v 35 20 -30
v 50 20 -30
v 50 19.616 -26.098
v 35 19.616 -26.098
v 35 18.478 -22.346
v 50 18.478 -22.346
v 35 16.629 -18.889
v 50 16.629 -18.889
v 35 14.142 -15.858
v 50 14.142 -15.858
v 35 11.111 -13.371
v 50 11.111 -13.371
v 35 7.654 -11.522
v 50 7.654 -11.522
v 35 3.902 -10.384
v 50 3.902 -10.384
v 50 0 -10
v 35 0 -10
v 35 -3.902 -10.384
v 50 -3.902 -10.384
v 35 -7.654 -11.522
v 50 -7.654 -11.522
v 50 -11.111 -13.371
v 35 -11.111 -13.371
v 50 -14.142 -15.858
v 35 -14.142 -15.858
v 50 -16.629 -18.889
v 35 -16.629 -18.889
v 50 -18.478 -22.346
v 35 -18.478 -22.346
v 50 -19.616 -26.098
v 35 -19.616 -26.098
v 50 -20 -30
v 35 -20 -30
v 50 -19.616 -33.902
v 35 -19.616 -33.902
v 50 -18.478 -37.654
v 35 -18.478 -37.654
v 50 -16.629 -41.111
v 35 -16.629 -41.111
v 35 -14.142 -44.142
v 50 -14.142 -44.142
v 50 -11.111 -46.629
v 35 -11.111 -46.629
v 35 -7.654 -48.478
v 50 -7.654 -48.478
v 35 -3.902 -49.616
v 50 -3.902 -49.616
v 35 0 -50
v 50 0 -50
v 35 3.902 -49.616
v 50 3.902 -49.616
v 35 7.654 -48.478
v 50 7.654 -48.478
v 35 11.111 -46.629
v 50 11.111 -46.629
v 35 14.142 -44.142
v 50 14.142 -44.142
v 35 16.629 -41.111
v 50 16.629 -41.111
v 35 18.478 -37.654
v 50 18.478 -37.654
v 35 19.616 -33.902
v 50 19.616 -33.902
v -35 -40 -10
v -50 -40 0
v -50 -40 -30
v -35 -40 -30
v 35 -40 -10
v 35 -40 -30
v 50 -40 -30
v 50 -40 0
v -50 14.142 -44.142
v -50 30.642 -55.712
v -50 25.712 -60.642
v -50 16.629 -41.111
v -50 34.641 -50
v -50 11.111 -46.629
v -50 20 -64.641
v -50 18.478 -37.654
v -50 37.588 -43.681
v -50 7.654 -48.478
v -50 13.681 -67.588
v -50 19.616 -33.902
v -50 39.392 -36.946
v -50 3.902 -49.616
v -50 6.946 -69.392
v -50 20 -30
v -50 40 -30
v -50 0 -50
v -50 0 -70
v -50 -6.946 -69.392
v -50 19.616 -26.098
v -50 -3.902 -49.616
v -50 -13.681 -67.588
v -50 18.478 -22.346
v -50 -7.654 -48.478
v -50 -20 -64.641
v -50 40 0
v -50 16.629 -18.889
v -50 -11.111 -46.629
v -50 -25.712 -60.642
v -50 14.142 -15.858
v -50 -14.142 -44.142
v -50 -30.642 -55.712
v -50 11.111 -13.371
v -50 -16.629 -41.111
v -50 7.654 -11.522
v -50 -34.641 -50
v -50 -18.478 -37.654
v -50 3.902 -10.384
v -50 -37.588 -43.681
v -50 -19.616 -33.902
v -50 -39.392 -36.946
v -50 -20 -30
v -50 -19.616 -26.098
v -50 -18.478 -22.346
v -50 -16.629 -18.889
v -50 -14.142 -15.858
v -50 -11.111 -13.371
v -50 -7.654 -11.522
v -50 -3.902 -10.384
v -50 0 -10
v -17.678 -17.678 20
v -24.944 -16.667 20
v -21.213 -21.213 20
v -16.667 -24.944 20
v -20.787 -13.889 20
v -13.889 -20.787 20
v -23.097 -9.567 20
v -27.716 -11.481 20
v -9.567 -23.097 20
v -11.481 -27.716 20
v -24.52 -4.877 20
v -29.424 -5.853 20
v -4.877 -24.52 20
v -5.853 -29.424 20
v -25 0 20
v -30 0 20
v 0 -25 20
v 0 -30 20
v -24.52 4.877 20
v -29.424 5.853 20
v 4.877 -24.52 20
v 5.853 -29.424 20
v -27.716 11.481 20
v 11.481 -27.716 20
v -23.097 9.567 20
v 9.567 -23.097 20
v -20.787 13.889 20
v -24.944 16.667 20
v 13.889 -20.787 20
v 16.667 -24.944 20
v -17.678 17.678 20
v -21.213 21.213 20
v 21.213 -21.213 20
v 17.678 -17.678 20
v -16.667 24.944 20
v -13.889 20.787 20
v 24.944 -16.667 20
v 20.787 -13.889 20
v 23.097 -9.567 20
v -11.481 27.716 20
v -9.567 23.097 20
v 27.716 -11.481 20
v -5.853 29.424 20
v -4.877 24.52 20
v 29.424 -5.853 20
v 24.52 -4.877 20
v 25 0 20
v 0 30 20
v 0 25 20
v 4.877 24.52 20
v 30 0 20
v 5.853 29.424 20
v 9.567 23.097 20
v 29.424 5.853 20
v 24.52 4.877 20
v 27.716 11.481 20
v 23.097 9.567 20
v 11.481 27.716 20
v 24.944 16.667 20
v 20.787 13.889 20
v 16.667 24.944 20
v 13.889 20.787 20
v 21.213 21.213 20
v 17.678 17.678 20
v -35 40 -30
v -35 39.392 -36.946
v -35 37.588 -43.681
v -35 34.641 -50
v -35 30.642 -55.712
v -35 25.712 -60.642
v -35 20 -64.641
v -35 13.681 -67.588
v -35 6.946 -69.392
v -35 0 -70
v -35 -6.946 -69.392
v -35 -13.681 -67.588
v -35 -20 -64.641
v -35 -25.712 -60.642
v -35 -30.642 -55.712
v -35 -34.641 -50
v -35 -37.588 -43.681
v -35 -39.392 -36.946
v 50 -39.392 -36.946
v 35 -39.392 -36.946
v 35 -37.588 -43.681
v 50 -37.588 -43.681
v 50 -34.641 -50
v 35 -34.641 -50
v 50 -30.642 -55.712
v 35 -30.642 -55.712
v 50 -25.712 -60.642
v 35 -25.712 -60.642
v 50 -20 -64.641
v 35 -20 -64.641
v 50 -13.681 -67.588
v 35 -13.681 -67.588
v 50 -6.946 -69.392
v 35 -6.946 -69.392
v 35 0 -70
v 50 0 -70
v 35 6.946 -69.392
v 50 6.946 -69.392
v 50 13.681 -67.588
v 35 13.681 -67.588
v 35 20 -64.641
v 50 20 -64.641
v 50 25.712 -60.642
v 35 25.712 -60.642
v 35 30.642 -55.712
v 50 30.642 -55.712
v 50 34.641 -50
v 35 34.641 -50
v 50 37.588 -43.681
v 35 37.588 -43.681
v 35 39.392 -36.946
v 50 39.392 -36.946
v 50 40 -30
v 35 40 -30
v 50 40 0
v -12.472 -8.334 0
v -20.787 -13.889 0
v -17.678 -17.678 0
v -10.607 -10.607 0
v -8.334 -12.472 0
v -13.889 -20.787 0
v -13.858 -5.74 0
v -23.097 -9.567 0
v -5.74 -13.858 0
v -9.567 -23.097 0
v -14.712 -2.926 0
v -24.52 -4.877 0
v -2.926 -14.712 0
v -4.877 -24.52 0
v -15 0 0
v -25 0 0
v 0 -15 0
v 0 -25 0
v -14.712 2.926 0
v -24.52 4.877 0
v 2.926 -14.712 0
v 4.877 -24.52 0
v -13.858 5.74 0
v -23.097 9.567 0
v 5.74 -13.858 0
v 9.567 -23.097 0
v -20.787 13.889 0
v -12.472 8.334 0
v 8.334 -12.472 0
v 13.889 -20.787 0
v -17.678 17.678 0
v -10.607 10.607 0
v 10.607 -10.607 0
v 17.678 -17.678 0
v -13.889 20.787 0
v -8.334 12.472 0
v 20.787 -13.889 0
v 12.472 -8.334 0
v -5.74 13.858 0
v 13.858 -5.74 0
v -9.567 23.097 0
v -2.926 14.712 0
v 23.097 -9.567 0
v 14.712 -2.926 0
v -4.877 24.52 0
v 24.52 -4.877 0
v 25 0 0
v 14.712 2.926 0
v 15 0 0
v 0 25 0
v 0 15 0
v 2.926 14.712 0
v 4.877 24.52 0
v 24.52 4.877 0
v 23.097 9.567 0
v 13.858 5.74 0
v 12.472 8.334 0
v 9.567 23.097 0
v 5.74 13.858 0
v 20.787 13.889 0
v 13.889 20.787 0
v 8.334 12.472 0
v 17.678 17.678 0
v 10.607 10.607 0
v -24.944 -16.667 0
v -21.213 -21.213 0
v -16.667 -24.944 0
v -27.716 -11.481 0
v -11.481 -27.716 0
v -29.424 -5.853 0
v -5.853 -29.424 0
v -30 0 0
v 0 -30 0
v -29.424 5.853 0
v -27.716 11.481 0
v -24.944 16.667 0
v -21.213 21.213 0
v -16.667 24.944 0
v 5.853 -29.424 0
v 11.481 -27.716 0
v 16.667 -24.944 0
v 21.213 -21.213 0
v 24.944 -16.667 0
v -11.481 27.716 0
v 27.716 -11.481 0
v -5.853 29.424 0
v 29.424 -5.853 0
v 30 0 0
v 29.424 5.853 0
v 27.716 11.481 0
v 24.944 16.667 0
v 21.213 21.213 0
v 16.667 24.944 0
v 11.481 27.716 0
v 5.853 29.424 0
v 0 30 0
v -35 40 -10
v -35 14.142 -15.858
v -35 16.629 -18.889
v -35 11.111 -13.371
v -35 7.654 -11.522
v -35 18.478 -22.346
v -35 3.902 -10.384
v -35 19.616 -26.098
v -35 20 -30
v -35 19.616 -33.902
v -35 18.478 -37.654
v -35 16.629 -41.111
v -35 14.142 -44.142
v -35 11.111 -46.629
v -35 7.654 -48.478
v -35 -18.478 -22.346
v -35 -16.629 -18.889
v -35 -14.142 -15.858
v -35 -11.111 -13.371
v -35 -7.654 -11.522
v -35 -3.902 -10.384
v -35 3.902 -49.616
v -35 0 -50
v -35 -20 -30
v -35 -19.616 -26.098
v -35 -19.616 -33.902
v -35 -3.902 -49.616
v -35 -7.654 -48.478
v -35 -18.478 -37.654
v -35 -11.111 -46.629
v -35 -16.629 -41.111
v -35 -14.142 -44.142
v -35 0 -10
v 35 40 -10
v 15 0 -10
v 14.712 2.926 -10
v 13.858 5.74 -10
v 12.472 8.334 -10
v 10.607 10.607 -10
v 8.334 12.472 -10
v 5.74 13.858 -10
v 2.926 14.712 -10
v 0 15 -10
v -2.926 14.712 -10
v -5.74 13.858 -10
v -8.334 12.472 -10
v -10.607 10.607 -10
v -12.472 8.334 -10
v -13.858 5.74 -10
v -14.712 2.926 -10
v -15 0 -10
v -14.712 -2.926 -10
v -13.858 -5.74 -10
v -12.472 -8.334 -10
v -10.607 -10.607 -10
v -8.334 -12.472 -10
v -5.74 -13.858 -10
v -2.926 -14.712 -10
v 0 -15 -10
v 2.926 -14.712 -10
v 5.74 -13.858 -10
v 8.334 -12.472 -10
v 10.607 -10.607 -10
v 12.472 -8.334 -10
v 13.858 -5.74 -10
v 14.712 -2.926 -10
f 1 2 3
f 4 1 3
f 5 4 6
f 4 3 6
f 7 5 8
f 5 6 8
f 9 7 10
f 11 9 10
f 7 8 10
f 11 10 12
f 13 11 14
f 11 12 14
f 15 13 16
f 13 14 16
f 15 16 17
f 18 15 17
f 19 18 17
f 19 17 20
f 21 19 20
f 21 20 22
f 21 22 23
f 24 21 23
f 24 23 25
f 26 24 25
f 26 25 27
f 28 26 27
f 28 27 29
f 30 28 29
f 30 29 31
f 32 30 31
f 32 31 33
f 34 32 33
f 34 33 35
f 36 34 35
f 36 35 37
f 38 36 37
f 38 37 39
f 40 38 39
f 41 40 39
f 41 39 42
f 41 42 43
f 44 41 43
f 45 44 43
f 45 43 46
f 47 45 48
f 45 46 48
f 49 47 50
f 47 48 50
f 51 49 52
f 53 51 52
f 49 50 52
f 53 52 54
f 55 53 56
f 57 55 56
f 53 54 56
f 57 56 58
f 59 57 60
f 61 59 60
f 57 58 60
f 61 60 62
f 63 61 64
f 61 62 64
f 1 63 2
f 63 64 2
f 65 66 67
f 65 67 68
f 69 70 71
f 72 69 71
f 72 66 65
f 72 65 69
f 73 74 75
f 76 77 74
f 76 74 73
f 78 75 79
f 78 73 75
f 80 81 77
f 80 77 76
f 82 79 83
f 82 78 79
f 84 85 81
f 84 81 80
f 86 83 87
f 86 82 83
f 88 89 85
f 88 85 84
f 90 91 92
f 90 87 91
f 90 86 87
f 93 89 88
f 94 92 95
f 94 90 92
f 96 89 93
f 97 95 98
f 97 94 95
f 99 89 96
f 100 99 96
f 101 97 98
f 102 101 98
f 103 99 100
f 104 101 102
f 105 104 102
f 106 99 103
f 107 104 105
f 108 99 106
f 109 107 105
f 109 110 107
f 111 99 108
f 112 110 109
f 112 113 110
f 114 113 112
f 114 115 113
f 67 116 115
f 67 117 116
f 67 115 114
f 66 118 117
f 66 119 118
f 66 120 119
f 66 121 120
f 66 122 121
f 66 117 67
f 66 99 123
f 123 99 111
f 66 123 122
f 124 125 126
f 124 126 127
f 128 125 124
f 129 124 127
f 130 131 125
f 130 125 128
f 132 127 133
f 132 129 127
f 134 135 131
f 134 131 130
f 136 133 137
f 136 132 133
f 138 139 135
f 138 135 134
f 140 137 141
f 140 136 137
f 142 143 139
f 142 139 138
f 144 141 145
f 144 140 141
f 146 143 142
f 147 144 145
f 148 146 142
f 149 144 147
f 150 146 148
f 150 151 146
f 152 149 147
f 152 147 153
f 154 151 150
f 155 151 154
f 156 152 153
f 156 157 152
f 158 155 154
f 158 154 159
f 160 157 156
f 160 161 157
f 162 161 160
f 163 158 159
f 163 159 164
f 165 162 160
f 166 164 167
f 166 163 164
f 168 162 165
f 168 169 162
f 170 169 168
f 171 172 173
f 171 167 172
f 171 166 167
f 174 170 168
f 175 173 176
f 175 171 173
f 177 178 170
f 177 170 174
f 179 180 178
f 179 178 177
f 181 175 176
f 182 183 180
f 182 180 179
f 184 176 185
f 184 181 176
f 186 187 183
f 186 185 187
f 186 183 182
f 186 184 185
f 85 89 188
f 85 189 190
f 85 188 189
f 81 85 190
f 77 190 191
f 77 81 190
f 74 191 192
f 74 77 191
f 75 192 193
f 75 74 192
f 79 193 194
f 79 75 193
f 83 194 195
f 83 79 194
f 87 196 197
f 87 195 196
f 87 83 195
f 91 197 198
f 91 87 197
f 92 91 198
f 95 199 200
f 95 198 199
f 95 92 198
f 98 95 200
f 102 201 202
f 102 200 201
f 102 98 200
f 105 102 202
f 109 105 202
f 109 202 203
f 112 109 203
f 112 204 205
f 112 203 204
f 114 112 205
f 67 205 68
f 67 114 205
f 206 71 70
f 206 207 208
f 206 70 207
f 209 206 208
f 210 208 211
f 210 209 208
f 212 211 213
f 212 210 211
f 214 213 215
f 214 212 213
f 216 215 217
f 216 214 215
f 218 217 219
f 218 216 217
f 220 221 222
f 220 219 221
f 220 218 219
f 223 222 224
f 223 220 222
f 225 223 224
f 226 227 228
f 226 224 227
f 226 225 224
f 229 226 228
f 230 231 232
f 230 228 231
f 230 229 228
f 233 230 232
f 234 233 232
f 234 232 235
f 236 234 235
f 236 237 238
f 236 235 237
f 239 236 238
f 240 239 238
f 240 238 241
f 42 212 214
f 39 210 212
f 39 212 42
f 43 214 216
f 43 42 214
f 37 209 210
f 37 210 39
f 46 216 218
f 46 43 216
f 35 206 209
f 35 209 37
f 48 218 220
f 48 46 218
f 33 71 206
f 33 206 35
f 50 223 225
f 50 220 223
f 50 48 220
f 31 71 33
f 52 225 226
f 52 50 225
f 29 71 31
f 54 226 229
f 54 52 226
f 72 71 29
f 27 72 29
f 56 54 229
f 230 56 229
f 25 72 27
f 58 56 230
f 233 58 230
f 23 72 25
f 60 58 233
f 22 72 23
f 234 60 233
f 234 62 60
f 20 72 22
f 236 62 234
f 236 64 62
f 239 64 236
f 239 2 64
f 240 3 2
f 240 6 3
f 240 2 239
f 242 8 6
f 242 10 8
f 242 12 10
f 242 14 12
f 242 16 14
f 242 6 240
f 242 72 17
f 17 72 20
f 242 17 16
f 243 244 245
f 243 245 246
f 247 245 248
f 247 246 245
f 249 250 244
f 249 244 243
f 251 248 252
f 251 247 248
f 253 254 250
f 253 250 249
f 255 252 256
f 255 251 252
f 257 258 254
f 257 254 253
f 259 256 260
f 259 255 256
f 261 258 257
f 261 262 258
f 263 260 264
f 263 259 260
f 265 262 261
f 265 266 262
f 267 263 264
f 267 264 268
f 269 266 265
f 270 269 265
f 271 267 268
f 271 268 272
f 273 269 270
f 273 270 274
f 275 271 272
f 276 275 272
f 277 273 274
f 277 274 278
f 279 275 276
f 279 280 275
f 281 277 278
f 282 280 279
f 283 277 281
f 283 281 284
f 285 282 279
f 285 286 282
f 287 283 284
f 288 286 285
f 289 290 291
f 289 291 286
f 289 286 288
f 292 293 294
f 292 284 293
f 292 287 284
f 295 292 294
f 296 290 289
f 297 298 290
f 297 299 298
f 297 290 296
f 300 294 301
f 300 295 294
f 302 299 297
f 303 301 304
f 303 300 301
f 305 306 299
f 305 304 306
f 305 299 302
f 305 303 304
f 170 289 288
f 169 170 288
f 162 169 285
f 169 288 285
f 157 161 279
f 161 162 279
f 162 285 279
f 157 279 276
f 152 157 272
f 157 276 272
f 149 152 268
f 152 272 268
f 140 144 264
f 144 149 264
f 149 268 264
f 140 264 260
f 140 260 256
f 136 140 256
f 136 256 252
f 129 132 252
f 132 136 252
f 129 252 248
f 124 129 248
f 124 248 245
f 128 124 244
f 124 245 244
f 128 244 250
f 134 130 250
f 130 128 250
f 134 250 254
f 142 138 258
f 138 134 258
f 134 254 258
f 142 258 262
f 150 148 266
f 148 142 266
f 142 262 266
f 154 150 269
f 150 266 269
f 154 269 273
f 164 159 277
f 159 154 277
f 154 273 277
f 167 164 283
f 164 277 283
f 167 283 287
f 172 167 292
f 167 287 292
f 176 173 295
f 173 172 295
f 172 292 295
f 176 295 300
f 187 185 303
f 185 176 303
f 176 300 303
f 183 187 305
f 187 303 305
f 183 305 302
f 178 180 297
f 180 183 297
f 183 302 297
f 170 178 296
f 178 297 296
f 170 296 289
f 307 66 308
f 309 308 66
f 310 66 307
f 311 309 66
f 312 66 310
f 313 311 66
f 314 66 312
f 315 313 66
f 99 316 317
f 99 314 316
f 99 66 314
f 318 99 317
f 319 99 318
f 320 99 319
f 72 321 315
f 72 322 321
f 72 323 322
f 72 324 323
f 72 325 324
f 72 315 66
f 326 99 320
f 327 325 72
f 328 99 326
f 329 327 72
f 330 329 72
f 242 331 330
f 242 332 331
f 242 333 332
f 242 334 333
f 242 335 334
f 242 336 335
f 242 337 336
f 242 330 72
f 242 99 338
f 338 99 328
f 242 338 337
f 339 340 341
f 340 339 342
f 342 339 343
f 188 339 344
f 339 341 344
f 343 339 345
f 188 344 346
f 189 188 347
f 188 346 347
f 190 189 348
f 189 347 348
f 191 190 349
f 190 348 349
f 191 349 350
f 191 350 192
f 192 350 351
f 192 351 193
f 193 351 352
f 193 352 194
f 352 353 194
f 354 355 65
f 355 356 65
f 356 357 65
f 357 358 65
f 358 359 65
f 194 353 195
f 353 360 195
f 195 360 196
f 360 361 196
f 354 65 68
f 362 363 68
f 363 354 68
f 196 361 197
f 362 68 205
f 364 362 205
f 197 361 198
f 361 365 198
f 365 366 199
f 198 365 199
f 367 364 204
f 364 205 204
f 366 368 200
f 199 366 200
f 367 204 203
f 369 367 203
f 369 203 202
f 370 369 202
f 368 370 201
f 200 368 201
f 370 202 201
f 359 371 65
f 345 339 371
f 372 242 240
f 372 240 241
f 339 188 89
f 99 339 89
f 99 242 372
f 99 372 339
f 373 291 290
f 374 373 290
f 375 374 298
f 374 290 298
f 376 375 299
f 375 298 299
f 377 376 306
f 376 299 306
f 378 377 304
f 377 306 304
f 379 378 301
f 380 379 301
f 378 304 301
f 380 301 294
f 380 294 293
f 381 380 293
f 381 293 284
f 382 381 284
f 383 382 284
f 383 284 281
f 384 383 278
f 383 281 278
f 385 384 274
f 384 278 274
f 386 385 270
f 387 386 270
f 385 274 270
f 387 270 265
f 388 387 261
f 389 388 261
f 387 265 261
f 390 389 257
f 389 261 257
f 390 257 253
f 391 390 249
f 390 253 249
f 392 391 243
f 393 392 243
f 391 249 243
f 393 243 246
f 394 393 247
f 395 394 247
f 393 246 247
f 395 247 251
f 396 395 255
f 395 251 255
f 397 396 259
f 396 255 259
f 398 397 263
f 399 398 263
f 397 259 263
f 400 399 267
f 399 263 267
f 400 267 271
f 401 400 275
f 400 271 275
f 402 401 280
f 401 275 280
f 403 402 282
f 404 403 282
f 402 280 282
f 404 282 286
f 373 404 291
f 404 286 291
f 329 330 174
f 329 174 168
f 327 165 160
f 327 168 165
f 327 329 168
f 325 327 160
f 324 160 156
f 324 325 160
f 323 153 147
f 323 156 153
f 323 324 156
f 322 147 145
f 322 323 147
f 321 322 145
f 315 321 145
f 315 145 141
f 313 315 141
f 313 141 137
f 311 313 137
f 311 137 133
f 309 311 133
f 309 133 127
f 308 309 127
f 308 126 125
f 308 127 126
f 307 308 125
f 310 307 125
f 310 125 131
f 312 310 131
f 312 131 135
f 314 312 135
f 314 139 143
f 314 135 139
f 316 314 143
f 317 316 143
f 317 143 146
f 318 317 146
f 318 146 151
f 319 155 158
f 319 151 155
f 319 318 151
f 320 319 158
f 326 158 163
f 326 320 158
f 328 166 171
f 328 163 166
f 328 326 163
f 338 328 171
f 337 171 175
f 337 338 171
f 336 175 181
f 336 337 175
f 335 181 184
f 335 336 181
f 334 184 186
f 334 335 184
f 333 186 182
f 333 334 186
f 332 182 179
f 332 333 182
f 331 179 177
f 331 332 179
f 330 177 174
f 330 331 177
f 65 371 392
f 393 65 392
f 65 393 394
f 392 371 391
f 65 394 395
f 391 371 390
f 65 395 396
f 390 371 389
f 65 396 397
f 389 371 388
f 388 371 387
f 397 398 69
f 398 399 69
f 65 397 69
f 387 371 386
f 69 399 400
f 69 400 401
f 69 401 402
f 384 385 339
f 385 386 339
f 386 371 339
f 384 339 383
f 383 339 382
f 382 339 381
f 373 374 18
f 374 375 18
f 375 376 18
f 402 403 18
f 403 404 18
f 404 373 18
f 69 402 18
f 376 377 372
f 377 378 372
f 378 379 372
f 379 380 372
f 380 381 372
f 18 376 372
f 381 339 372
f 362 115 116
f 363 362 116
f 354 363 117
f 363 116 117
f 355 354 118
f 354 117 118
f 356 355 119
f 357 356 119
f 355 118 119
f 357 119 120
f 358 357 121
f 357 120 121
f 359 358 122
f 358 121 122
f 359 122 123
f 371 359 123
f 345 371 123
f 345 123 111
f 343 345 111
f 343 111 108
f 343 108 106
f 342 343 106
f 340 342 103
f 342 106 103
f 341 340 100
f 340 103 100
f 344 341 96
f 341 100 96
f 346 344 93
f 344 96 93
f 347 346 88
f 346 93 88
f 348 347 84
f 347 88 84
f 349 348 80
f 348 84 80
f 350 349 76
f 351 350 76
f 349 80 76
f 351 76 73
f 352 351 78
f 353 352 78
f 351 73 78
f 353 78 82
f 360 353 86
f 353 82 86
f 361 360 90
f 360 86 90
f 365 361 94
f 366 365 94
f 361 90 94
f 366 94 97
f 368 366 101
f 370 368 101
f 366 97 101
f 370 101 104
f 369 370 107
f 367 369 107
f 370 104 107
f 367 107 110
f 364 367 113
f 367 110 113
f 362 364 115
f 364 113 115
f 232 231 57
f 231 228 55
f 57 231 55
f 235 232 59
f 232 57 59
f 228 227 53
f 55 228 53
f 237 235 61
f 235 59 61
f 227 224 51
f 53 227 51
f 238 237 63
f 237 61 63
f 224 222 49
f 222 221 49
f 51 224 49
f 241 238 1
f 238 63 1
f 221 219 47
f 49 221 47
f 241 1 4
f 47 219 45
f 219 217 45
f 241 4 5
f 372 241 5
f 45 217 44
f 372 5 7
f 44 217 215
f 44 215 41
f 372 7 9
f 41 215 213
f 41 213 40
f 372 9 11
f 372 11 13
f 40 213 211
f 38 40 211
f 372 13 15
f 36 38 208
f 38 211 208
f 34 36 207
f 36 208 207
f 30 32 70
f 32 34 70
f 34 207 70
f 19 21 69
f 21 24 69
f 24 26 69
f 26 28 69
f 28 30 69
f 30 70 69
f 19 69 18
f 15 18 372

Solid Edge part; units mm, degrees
sketch "Sketch1" plane through (0, 0, 0) normal (0, 0, 1) x (1, 0, 0)
  line L0 (-50, -40) -> (50, -40)
  line L1 (50, -40) -> (50, 40)
  line L2 (50, 40) -> (-50, 40)
  line L3 (-50, 40) -> (-50, -40)
extrude "Protrusion1" add sketch "Sketch1" against normal blind 10
sketch "Sketch2" plane through (50, 0, -5) normal (1, 0, 0) x (0, 1, 0)
  line L0 (-40, -5) -> (-40, -25)
  line L1 (40, -5) -> (-40, -5)
  line L2 (40, -25) -> (40, -5)
  arc A0 (40, -25) -> (-40, -25) centre (0, -25) cw
extrude "Protrusion_2" add sketch "Sketch2" against normal blind 15
sketch "Sketch3" plane through (-50, 0, -5) normal (-1, 0, 0) x (0, -1, 0)
  line L0 (-40, -5) -> (-40, -25)
  line L1 (40, -5) -> (-40, -5)
  line L2 (40, -25) -> (40, -5)
  arc A0 (40, -25) -> (-40, -25) centre (0, -25) cw
extrude "Protrusion_3" add sketch "Sketch3" against normal blind 15
sketch "Sketch4" plane through (50, 0, -35) normal (1, 0, 0) x (0, 1, 0)
  circle A0 centre (0, 5) radius 20
extrude "ExtrudedCutout_1" cut sketch "Sketch4" against normal blind 25.6414
sketch "Sketch5" plane through (-50, 0, -35) normal (-1, 0, 0) x (0, -1, 0)
  circle A0 centre (0, 5) radius 20
extrude "ExtrudedCutout_2" cut sketch "Sketch5" against normal blind 43.9388
sketch "Sketch6" plane through (0, 0, 0) normal (0, 0, 1) x (1, 0, 0)
  circle A0 centre (0, 0) radius 15
extrude "Cutout_3" cut sketch "Sketch6" against normal blind 37.3136
sketch "Sketch7" plane through (0, 0, 0) normal (0, 0, 1) x (1, 0, 0)
  circle A0 centre (0, 0) radius 30
  circle A1 centre (0, 0) radius 25
extrude "Protrusion_4" add sketch "Sketch7" along normal blind 20
